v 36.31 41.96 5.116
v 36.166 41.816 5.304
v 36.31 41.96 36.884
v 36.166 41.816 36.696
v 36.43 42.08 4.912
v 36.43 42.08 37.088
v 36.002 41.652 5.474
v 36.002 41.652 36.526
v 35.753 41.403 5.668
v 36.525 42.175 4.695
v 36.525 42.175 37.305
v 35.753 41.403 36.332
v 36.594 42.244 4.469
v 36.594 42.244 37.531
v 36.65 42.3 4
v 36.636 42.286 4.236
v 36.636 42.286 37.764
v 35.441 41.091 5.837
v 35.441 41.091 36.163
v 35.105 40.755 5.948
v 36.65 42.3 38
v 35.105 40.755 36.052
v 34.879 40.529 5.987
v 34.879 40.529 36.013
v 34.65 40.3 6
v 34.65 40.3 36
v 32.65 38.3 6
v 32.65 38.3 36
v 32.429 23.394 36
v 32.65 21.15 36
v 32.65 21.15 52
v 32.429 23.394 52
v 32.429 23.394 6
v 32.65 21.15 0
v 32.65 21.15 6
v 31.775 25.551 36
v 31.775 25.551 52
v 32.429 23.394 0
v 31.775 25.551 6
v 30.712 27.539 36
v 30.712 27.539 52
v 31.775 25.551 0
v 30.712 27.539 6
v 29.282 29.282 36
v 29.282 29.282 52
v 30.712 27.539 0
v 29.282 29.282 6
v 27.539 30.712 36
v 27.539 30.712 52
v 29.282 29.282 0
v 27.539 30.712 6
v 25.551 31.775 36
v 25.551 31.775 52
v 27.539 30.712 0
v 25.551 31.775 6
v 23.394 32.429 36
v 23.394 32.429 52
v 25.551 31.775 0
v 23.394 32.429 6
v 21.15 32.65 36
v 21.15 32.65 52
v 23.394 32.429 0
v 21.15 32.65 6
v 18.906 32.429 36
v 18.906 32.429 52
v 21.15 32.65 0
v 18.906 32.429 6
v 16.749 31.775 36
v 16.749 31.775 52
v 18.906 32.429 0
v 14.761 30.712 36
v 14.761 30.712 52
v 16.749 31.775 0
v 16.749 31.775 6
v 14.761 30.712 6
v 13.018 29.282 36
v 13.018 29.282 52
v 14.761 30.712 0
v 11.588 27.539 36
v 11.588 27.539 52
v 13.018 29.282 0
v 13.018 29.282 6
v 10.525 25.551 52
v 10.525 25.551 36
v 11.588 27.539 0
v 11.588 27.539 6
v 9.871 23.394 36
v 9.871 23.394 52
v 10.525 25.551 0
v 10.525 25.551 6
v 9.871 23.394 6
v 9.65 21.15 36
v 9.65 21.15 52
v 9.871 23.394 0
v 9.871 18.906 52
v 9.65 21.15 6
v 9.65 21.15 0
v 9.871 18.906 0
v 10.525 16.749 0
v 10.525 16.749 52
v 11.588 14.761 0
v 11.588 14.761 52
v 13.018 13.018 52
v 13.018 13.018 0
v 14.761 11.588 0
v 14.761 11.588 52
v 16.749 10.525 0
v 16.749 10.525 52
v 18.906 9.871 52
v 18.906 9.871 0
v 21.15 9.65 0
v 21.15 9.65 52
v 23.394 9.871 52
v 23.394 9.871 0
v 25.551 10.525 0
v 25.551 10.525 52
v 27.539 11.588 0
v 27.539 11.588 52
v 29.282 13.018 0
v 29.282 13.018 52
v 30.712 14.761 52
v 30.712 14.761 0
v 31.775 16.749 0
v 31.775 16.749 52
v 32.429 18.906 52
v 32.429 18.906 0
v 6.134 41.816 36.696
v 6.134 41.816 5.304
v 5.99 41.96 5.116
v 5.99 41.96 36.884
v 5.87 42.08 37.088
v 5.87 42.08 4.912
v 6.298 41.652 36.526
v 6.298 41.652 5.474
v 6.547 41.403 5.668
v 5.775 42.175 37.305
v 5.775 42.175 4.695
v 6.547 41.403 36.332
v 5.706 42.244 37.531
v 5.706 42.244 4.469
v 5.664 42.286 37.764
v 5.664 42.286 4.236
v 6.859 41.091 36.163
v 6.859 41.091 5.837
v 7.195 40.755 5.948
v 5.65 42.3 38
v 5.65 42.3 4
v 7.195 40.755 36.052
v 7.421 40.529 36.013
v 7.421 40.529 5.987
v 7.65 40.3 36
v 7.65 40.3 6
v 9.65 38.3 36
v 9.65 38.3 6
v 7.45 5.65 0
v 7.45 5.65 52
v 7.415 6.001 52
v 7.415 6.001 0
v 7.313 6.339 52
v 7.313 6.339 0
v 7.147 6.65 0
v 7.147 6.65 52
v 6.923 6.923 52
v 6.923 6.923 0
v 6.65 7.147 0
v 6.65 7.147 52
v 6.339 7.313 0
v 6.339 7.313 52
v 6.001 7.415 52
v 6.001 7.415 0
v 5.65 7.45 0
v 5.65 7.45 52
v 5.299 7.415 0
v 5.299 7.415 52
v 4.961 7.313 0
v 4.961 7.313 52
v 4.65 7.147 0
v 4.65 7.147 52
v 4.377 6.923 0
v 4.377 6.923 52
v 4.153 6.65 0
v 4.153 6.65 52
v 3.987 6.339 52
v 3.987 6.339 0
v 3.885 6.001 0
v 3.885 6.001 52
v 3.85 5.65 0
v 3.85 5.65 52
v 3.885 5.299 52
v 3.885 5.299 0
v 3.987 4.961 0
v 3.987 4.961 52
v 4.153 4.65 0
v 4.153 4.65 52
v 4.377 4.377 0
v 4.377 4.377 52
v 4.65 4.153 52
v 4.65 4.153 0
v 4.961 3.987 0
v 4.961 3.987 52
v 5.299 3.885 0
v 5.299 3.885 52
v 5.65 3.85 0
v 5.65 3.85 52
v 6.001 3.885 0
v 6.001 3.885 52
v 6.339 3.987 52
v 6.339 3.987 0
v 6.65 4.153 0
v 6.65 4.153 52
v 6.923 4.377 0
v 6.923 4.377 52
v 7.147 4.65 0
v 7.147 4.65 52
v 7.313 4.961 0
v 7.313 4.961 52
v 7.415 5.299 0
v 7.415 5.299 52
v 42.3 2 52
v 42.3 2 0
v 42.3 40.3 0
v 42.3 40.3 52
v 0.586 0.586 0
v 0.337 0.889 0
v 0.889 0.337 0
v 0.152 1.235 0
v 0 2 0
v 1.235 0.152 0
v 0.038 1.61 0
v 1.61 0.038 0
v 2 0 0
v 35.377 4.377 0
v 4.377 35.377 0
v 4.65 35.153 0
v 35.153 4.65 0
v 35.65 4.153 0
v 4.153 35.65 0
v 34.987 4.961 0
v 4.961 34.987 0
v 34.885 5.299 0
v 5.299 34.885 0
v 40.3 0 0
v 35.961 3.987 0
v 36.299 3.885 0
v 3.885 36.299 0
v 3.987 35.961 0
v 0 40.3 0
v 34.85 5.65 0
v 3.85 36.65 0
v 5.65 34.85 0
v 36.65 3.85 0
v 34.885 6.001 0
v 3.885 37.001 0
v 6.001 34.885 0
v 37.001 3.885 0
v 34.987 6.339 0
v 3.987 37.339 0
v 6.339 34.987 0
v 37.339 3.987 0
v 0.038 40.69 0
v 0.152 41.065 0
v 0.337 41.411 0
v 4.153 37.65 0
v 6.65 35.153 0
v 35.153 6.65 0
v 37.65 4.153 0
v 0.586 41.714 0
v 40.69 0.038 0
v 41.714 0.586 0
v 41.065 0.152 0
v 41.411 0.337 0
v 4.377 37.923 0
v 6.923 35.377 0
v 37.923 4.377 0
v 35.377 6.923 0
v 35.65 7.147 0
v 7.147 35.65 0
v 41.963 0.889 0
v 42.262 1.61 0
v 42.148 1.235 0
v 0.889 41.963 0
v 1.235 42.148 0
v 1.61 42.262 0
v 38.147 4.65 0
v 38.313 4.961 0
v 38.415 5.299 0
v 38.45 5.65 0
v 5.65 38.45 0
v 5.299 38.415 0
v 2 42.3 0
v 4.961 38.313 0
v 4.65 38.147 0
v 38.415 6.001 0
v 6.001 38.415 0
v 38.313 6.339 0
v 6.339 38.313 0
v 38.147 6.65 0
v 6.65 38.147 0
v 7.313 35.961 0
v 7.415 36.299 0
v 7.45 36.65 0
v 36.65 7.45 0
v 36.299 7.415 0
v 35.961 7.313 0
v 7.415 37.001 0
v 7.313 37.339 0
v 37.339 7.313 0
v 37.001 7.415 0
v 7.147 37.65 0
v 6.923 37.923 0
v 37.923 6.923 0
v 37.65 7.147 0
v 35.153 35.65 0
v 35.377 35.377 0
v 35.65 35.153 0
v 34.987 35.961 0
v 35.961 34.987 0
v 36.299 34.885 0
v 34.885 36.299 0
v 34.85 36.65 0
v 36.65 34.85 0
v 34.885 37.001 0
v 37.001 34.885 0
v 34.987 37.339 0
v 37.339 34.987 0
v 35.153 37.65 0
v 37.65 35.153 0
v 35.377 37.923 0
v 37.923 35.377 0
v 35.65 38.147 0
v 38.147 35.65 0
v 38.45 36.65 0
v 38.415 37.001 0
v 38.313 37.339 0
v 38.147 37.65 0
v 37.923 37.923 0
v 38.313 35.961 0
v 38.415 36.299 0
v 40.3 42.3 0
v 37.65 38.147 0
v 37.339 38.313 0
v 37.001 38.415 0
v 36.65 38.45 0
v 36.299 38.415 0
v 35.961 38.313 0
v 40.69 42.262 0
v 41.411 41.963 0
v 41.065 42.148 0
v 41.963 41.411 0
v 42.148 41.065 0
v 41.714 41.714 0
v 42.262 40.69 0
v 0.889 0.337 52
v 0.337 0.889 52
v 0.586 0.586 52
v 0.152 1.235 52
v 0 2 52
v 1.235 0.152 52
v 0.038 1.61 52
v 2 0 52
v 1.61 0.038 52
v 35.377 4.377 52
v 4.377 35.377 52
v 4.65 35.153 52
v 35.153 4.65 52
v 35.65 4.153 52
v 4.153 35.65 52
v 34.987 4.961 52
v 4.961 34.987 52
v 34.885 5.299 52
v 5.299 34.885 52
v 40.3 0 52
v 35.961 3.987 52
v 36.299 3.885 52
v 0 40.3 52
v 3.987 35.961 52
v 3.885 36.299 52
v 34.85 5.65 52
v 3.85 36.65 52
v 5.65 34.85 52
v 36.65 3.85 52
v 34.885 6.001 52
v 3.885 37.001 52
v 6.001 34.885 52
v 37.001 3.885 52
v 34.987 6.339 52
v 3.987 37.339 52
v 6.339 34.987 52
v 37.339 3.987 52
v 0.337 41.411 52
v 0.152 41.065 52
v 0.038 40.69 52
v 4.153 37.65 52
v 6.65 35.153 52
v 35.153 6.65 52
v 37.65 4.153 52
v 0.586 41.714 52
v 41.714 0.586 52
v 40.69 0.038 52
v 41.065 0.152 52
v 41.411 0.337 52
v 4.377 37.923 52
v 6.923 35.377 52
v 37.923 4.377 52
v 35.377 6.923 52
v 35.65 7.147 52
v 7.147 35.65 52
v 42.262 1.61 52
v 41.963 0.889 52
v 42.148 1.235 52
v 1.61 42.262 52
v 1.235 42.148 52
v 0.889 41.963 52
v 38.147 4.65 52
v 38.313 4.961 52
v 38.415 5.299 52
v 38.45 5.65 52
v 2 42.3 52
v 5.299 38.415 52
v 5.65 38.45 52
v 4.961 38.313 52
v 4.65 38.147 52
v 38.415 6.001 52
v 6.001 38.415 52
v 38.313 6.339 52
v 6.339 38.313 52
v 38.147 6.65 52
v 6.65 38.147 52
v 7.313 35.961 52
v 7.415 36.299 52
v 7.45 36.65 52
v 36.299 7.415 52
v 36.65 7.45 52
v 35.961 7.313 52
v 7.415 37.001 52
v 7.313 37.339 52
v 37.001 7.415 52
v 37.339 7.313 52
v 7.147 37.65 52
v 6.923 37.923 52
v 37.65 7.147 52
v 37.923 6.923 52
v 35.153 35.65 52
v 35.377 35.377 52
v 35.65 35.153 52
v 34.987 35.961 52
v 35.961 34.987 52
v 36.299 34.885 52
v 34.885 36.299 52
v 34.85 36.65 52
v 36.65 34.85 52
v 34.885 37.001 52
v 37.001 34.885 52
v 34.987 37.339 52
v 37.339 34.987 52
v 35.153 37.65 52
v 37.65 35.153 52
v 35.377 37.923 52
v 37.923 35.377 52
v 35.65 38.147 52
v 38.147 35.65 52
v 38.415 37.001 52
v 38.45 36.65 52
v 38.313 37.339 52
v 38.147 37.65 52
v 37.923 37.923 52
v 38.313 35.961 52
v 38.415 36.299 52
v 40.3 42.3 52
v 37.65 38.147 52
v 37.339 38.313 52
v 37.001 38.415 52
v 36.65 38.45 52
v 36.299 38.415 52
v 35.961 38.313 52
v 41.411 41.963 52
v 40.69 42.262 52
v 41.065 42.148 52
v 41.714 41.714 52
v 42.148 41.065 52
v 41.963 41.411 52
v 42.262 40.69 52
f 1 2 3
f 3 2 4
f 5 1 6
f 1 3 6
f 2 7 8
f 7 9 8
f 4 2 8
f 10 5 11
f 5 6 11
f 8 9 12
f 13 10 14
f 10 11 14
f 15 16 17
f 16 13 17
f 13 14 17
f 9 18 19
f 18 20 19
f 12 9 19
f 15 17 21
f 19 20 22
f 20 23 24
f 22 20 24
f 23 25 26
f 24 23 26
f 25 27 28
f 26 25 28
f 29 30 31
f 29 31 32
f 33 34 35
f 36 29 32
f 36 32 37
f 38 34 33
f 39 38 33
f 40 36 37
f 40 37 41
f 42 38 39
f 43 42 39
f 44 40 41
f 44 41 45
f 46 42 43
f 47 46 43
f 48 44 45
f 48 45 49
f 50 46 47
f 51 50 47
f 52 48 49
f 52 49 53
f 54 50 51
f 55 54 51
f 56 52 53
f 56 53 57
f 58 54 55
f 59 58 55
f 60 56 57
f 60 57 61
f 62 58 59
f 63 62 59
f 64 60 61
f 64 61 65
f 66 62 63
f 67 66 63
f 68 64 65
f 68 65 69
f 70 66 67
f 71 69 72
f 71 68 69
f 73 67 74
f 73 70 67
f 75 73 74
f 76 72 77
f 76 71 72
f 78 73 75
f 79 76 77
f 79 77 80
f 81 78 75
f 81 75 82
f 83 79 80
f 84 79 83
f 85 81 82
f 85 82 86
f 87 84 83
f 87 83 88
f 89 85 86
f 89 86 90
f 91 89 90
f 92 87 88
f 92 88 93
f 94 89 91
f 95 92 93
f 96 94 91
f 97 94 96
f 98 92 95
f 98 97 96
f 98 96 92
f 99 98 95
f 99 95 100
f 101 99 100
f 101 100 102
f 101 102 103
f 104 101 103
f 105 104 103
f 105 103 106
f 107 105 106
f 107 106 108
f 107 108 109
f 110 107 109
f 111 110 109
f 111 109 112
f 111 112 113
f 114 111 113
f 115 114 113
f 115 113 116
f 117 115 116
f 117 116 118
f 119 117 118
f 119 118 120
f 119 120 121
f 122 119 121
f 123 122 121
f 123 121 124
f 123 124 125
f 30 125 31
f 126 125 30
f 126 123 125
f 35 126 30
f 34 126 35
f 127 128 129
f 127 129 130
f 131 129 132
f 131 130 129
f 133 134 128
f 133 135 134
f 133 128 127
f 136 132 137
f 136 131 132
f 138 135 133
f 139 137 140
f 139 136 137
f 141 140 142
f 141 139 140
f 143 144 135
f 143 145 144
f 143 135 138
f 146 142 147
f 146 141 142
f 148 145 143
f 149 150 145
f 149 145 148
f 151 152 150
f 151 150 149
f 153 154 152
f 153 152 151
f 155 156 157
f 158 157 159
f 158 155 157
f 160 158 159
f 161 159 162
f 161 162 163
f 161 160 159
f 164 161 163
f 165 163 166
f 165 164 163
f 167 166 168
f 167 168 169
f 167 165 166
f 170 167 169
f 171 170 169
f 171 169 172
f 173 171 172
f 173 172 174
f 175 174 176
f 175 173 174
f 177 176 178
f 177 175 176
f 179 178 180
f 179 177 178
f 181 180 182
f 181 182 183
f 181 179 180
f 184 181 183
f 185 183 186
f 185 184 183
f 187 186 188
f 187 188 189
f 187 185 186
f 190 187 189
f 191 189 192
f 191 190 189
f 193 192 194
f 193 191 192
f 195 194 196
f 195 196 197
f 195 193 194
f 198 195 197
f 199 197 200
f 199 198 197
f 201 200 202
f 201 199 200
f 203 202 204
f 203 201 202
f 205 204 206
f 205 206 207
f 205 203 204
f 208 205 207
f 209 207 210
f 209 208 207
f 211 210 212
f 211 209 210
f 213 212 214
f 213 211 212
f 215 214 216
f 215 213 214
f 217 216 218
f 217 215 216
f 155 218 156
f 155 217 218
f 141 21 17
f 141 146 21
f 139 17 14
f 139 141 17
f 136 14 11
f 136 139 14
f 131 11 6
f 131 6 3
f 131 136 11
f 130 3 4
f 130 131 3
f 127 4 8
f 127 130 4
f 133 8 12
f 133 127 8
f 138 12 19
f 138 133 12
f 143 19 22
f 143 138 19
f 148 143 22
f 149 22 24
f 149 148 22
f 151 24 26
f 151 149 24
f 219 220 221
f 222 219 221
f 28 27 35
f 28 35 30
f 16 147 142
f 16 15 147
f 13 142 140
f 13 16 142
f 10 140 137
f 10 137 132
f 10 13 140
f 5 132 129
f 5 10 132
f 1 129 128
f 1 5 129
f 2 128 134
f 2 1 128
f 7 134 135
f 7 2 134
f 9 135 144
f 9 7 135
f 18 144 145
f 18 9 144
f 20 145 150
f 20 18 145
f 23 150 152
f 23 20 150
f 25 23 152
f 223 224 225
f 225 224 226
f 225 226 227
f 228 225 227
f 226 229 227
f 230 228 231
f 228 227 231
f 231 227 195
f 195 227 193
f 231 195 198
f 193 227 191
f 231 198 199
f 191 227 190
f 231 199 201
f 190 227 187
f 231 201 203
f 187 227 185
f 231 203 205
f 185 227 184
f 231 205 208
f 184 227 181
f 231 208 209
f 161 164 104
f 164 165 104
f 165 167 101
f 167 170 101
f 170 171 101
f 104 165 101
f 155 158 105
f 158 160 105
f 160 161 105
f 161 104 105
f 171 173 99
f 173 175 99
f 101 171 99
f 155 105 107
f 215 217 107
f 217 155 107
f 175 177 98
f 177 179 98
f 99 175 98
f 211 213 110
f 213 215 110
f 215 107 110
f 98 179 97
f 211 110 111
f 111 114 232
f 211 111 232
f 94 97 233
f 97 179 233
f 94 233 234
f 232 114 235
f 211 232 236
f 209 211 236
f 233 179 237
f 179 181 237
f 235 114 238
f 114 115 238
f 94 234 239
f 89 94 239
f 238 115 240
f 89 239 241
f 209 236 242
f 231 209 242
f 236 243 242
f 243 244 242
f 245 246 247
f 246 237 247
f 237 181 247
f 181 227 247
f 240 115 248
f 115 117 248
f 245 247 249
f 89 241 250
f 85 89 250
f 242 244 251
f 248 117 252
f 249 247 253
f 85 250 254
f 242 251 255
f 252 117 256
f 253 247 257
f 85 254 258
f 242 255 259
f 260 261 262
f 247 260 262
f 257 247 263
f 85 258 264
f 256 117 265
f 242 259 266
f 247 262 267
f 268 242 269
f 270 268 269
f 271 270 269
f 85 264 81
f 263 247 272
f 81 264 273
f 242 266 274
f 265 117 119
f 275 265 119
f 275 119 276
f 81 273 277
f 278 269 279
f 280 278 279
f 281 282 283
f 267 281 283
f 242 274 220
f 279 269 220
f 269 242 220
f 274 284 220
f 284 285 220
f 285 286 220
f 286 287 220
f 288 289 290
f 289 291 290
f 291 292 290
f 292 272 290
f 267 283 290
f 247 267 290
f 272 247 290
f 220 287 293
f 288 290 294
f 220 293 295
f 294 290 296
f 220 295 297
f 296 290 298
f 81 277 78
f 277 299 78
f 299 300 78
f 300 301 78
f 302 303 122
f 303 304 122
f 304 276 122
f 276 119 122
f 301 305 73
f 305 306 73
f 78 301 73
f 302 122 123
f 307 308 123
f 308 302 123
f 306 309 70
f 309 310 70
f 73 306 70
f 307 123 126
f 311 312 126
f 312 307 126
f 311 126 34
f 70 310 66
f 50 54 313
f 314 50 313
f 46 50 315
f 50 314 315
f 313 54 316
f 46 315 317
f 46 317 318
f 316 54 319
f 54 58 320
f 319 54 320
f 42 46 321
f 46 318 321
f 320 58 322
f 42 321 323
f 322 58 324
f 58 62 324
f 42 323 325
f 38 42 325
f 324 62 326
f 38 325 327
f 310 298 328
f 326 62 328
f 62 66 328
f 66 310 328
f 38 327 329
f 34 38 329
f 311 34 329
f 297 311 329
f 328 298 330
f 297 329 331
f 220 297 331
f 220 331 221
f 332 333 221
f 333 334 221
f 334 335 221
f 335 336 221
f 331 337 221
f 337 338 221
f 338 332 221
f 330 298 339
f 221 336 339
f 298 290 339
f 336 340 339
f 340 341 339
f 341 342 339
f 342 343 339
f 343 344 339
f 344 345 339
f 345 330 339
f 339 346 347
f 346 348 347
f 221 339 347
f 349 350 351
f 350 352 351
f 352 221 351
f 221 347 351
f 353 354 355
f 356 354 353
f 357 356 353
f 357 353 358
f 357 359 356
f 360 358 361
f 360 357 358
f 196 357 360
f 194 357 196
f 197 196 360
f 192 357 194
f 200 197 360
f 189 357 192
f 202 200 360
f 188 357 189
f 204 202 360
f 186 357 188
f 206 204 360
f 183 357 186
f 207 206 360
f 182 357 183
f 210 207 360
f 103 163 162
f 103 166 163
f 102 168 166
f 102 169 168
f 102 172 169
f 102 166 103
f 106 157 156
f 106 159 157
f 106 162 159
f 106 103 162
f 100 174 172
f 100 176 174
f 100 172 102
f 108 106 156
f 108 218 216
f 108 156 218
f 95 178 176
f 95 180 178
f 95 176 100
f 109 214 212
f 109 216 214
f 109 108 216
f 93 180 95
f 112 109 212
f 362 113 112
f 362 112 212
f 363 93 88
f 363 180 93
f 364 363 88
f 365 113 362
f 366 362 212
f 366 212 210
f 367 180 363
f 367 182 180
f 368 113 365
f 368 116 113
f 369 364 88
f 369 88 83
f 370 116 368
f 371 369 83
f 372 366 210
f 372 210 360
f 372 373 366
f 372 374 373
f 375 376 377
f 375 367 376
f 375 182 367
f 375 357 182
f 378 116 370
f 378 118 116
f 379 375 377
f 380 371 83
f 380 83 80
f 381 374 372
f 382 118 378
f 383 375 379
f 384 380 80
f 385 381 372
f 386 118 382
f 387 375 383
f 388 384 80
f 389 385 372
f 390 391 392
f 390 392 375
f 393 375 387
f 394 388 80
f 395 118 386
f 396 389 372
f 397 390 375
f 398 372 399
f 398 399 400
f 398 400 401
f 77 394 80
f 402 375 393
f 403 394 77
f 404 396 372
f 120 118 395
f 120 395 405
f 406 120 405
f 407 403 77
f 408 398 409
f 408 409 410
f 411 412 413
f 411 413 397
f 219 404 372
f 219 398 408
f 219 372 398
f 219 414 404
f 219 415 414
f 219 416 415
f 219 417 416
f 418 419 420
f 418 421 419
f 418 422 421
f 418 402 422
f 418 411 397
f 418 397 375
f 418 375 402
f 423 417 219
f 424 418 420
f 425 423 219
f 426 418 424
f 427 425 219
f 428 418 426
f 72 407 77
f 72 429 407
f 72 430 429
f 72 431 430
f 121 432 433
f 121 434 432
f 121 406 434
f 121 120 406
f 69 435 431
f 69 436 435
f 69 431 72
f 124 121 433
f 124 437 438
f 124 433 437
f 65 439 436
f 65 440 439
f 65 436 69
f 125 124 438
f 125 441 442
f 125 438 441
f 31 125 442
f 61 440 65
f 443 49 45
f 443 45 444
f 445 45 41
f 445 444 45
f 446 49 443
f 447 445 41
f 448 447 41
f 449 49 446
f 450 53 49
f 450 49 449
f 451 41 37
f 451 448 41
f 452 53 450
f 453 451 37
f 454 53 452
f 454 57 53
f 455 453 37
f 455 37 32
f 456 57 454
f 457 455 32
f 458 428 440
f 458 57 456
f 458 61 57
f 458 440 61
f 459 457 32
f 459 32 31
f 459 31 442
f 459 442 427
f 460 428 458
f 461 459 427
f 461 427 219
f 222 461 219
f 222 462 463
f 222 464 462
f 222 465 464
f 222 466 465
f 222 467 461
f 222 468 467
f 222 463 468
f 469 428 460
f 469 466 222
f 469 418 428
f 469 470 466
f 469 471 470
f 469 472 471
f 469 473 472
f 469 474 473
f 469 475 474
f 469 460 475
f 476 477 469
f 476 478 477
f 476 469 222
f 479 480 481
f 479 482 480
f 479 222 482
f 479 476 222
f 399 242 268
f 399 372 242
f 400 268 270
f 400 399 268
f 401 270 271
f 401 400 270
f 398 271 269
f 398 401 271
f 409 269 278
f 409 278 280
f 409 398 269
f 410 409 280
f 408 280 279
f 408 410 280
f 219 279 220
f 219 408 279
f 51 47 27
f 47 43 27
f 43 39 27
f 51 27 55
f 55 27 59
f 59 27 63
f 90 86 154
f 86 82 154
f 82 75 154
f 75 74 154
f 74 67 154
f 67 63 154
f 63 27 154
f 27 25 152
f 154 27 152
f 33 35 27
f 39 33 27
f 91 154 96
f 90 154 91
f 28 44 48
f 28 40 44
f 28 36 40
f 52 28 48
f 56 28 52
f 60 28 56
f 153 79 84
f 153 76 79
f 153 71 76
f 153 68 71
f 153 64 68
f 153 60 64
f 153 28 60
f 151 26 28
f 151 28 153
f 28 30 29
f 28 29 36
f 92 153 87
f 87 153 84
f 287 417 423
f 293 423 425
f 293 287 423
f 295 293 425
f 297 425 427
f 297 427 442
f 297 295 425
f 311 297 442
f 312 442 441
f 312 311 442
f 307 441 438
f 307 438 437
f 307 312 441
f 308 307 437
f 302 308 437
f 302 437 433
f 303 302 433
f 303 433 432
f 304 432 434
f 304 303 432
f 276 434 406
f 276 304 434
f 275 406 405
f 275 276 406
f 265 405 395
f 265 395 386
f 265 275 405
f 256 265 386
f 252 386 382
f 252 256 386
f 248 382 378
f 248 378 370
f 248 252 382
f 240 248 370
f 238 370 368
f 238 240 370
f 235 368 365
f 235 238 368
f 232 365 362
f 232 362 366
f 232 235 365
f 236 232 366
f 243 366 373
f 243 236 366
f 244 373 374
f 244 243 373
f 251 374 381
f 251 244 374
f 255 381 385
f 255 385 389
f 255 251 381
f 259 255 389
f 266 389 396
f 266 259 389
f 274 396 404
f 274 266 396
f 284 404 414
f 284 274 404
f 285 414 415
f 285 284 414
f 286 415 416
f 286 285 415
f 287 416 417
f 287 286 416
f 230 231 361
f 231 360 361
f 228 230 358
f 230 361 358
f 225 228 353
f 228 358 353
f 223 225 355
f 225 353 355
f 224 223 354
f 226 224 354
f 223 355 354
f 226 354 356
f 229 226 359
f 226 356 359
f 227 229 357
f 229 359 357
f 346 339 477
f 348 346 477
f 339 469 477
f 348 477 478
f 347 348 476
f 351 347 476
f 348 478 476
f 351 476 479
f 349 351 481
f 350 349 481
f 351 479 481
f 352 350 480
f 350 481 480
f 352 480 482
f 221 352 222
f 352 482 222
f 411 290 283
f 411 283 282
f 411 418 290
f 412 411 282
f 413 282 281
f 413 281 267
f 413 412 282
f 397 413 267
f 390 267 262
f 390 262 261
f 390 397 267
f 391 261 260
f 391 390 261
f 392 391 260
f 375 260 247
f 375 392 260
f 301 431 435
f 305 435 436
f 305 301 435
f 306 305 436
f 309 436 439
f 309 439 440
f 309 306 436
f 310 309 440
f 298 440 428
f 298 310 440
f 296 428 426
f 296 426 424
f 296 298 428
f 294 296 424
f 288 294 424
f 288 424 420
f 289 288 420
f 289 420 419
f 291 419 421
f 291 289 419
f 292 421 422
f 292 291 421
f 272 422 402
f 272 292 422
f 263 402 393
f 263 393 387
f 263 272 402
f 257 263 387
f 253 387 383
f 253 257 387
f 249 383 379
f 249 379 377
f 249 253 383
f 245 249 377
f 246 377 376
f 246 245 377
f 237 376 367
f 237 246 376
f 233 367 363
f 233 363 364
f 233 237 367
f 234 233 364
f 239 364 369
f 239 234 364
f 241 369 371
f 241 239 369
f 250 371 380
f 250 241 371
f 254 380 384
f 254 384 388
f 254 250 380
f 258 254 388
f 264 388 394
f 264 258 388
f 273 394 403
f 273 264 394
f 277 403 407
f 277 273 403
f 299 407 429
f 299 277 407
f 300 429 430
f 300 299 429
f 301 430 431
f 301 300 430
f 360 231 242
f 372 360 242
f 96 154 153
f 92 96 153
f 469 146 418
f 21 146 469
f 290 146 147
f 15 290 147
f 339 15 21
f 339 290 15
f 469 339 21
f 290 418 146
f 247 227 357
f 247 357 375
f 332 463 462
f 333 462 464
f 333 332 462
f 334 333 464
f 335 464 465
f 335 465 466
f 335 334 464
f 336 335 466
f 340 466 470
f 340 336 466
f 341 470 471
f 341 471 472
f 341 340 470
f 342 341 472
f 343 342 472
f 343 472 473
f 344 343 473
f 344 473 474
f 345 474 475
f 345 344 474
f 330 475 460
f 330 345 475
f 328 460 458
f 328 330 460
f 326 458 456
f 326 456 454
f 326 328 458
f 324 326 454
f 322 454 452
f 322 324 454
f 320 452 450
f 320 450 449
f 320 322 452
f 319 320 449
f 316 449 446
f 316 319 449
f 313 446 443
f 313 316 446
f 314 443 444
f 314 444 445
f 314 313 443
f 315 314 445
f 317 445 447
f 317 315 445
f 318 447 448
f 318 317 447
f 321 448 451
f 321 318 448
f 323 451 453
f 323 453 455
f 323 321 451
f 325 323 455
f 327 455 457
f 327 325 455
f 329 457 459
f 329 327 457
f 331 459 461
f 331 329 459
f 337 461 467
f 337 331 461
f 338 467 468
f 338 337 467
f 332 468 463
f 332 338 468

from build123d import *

# Parameters (mm, degrees)
SKETCH_W     = 42.3
SKETCH_H     = 42.3
SKETCH_R     = 1.8
SKETCH_R_2   = 11.5
PAD_DEPTH    = 52
SKETCH001_W  = 23
SKETCH001_H  = 30
POCKET_DEPTH = 21.15
CHAMFER_SIZE = 4
FILLET_R     = 2
FILLET001_R  = 2


with BuildPart() as part:
    # Sketch → Pad (new body)
    with BuildSketch(Plane.XY):
        with Locations((21.15, 21.15)):
            Rectangle(SKETCH_W, SKETCH_H)
        with Locations((5.65, 36.65)):
            Circle(SKETCH_R, mode=Mode.SUBTRACT)
        with Locations((36.65, 36.65)):
            Circle(SKETCH_R, mode=Mode.SUBTRACT)
        with Locations((36.65, 5.65)):
            Circle(SKETCH_R, mode=Mode.SUBTRACT)
        with Locations((5.65, 5.65)):
            Circle(SKETCH_R, mode=Mode.SUBTRACT)
        with Locations((21.15, 21.15)):
            Circle(SKETCH_R_2, mode=Mode.SUBTRACT)
    extrude(amount=PAD_DEPTH)

    # Sketch001 (on Face1 of Pad) → Pocket (cut)
    with BuildSketch(Plane(origin=(0, 42.3, 0), x_dir=(-1, 0, 0), z_dir=(0, 1, 0))):
        with Locations((-21.15, 21)):
            Rectangle(SKETCH001_W, SKETCH001_H)
    extrude(amount=-POCKET_DEPTH, mode=Mode.SUBTRACT)

    # Chamfer
    chamfer_edges = [part.edges().sort_by_distance(p)[0] for p in [
        (9.65, 42.3, 21),
        (32.65, 42.3, 21),
    ]]
    chamfer(chamfer_edges, length=CHAMFER_SIZE)

    # Fillet
    fillet_edges = [part.edges().sort_by_distance(p)[0] for p in [
        (42.3, 0, 26),
        (0, 0, 26),
        (42.3, 42.3, 26),
        (0, 42.3, 26),
    ]]
    fillet(fillet_edges, radius=FILLET_R)

    # Fillet001
    fillet001_edges = [part.edges().sort_by_distance(p)[0] for p in [
        (21.15, 42.3, 36),
        (21.15, 42.3, 6),
    ]]
    fillet(fillet001_edges, radius=FILLET001_R)


solid = part.part
